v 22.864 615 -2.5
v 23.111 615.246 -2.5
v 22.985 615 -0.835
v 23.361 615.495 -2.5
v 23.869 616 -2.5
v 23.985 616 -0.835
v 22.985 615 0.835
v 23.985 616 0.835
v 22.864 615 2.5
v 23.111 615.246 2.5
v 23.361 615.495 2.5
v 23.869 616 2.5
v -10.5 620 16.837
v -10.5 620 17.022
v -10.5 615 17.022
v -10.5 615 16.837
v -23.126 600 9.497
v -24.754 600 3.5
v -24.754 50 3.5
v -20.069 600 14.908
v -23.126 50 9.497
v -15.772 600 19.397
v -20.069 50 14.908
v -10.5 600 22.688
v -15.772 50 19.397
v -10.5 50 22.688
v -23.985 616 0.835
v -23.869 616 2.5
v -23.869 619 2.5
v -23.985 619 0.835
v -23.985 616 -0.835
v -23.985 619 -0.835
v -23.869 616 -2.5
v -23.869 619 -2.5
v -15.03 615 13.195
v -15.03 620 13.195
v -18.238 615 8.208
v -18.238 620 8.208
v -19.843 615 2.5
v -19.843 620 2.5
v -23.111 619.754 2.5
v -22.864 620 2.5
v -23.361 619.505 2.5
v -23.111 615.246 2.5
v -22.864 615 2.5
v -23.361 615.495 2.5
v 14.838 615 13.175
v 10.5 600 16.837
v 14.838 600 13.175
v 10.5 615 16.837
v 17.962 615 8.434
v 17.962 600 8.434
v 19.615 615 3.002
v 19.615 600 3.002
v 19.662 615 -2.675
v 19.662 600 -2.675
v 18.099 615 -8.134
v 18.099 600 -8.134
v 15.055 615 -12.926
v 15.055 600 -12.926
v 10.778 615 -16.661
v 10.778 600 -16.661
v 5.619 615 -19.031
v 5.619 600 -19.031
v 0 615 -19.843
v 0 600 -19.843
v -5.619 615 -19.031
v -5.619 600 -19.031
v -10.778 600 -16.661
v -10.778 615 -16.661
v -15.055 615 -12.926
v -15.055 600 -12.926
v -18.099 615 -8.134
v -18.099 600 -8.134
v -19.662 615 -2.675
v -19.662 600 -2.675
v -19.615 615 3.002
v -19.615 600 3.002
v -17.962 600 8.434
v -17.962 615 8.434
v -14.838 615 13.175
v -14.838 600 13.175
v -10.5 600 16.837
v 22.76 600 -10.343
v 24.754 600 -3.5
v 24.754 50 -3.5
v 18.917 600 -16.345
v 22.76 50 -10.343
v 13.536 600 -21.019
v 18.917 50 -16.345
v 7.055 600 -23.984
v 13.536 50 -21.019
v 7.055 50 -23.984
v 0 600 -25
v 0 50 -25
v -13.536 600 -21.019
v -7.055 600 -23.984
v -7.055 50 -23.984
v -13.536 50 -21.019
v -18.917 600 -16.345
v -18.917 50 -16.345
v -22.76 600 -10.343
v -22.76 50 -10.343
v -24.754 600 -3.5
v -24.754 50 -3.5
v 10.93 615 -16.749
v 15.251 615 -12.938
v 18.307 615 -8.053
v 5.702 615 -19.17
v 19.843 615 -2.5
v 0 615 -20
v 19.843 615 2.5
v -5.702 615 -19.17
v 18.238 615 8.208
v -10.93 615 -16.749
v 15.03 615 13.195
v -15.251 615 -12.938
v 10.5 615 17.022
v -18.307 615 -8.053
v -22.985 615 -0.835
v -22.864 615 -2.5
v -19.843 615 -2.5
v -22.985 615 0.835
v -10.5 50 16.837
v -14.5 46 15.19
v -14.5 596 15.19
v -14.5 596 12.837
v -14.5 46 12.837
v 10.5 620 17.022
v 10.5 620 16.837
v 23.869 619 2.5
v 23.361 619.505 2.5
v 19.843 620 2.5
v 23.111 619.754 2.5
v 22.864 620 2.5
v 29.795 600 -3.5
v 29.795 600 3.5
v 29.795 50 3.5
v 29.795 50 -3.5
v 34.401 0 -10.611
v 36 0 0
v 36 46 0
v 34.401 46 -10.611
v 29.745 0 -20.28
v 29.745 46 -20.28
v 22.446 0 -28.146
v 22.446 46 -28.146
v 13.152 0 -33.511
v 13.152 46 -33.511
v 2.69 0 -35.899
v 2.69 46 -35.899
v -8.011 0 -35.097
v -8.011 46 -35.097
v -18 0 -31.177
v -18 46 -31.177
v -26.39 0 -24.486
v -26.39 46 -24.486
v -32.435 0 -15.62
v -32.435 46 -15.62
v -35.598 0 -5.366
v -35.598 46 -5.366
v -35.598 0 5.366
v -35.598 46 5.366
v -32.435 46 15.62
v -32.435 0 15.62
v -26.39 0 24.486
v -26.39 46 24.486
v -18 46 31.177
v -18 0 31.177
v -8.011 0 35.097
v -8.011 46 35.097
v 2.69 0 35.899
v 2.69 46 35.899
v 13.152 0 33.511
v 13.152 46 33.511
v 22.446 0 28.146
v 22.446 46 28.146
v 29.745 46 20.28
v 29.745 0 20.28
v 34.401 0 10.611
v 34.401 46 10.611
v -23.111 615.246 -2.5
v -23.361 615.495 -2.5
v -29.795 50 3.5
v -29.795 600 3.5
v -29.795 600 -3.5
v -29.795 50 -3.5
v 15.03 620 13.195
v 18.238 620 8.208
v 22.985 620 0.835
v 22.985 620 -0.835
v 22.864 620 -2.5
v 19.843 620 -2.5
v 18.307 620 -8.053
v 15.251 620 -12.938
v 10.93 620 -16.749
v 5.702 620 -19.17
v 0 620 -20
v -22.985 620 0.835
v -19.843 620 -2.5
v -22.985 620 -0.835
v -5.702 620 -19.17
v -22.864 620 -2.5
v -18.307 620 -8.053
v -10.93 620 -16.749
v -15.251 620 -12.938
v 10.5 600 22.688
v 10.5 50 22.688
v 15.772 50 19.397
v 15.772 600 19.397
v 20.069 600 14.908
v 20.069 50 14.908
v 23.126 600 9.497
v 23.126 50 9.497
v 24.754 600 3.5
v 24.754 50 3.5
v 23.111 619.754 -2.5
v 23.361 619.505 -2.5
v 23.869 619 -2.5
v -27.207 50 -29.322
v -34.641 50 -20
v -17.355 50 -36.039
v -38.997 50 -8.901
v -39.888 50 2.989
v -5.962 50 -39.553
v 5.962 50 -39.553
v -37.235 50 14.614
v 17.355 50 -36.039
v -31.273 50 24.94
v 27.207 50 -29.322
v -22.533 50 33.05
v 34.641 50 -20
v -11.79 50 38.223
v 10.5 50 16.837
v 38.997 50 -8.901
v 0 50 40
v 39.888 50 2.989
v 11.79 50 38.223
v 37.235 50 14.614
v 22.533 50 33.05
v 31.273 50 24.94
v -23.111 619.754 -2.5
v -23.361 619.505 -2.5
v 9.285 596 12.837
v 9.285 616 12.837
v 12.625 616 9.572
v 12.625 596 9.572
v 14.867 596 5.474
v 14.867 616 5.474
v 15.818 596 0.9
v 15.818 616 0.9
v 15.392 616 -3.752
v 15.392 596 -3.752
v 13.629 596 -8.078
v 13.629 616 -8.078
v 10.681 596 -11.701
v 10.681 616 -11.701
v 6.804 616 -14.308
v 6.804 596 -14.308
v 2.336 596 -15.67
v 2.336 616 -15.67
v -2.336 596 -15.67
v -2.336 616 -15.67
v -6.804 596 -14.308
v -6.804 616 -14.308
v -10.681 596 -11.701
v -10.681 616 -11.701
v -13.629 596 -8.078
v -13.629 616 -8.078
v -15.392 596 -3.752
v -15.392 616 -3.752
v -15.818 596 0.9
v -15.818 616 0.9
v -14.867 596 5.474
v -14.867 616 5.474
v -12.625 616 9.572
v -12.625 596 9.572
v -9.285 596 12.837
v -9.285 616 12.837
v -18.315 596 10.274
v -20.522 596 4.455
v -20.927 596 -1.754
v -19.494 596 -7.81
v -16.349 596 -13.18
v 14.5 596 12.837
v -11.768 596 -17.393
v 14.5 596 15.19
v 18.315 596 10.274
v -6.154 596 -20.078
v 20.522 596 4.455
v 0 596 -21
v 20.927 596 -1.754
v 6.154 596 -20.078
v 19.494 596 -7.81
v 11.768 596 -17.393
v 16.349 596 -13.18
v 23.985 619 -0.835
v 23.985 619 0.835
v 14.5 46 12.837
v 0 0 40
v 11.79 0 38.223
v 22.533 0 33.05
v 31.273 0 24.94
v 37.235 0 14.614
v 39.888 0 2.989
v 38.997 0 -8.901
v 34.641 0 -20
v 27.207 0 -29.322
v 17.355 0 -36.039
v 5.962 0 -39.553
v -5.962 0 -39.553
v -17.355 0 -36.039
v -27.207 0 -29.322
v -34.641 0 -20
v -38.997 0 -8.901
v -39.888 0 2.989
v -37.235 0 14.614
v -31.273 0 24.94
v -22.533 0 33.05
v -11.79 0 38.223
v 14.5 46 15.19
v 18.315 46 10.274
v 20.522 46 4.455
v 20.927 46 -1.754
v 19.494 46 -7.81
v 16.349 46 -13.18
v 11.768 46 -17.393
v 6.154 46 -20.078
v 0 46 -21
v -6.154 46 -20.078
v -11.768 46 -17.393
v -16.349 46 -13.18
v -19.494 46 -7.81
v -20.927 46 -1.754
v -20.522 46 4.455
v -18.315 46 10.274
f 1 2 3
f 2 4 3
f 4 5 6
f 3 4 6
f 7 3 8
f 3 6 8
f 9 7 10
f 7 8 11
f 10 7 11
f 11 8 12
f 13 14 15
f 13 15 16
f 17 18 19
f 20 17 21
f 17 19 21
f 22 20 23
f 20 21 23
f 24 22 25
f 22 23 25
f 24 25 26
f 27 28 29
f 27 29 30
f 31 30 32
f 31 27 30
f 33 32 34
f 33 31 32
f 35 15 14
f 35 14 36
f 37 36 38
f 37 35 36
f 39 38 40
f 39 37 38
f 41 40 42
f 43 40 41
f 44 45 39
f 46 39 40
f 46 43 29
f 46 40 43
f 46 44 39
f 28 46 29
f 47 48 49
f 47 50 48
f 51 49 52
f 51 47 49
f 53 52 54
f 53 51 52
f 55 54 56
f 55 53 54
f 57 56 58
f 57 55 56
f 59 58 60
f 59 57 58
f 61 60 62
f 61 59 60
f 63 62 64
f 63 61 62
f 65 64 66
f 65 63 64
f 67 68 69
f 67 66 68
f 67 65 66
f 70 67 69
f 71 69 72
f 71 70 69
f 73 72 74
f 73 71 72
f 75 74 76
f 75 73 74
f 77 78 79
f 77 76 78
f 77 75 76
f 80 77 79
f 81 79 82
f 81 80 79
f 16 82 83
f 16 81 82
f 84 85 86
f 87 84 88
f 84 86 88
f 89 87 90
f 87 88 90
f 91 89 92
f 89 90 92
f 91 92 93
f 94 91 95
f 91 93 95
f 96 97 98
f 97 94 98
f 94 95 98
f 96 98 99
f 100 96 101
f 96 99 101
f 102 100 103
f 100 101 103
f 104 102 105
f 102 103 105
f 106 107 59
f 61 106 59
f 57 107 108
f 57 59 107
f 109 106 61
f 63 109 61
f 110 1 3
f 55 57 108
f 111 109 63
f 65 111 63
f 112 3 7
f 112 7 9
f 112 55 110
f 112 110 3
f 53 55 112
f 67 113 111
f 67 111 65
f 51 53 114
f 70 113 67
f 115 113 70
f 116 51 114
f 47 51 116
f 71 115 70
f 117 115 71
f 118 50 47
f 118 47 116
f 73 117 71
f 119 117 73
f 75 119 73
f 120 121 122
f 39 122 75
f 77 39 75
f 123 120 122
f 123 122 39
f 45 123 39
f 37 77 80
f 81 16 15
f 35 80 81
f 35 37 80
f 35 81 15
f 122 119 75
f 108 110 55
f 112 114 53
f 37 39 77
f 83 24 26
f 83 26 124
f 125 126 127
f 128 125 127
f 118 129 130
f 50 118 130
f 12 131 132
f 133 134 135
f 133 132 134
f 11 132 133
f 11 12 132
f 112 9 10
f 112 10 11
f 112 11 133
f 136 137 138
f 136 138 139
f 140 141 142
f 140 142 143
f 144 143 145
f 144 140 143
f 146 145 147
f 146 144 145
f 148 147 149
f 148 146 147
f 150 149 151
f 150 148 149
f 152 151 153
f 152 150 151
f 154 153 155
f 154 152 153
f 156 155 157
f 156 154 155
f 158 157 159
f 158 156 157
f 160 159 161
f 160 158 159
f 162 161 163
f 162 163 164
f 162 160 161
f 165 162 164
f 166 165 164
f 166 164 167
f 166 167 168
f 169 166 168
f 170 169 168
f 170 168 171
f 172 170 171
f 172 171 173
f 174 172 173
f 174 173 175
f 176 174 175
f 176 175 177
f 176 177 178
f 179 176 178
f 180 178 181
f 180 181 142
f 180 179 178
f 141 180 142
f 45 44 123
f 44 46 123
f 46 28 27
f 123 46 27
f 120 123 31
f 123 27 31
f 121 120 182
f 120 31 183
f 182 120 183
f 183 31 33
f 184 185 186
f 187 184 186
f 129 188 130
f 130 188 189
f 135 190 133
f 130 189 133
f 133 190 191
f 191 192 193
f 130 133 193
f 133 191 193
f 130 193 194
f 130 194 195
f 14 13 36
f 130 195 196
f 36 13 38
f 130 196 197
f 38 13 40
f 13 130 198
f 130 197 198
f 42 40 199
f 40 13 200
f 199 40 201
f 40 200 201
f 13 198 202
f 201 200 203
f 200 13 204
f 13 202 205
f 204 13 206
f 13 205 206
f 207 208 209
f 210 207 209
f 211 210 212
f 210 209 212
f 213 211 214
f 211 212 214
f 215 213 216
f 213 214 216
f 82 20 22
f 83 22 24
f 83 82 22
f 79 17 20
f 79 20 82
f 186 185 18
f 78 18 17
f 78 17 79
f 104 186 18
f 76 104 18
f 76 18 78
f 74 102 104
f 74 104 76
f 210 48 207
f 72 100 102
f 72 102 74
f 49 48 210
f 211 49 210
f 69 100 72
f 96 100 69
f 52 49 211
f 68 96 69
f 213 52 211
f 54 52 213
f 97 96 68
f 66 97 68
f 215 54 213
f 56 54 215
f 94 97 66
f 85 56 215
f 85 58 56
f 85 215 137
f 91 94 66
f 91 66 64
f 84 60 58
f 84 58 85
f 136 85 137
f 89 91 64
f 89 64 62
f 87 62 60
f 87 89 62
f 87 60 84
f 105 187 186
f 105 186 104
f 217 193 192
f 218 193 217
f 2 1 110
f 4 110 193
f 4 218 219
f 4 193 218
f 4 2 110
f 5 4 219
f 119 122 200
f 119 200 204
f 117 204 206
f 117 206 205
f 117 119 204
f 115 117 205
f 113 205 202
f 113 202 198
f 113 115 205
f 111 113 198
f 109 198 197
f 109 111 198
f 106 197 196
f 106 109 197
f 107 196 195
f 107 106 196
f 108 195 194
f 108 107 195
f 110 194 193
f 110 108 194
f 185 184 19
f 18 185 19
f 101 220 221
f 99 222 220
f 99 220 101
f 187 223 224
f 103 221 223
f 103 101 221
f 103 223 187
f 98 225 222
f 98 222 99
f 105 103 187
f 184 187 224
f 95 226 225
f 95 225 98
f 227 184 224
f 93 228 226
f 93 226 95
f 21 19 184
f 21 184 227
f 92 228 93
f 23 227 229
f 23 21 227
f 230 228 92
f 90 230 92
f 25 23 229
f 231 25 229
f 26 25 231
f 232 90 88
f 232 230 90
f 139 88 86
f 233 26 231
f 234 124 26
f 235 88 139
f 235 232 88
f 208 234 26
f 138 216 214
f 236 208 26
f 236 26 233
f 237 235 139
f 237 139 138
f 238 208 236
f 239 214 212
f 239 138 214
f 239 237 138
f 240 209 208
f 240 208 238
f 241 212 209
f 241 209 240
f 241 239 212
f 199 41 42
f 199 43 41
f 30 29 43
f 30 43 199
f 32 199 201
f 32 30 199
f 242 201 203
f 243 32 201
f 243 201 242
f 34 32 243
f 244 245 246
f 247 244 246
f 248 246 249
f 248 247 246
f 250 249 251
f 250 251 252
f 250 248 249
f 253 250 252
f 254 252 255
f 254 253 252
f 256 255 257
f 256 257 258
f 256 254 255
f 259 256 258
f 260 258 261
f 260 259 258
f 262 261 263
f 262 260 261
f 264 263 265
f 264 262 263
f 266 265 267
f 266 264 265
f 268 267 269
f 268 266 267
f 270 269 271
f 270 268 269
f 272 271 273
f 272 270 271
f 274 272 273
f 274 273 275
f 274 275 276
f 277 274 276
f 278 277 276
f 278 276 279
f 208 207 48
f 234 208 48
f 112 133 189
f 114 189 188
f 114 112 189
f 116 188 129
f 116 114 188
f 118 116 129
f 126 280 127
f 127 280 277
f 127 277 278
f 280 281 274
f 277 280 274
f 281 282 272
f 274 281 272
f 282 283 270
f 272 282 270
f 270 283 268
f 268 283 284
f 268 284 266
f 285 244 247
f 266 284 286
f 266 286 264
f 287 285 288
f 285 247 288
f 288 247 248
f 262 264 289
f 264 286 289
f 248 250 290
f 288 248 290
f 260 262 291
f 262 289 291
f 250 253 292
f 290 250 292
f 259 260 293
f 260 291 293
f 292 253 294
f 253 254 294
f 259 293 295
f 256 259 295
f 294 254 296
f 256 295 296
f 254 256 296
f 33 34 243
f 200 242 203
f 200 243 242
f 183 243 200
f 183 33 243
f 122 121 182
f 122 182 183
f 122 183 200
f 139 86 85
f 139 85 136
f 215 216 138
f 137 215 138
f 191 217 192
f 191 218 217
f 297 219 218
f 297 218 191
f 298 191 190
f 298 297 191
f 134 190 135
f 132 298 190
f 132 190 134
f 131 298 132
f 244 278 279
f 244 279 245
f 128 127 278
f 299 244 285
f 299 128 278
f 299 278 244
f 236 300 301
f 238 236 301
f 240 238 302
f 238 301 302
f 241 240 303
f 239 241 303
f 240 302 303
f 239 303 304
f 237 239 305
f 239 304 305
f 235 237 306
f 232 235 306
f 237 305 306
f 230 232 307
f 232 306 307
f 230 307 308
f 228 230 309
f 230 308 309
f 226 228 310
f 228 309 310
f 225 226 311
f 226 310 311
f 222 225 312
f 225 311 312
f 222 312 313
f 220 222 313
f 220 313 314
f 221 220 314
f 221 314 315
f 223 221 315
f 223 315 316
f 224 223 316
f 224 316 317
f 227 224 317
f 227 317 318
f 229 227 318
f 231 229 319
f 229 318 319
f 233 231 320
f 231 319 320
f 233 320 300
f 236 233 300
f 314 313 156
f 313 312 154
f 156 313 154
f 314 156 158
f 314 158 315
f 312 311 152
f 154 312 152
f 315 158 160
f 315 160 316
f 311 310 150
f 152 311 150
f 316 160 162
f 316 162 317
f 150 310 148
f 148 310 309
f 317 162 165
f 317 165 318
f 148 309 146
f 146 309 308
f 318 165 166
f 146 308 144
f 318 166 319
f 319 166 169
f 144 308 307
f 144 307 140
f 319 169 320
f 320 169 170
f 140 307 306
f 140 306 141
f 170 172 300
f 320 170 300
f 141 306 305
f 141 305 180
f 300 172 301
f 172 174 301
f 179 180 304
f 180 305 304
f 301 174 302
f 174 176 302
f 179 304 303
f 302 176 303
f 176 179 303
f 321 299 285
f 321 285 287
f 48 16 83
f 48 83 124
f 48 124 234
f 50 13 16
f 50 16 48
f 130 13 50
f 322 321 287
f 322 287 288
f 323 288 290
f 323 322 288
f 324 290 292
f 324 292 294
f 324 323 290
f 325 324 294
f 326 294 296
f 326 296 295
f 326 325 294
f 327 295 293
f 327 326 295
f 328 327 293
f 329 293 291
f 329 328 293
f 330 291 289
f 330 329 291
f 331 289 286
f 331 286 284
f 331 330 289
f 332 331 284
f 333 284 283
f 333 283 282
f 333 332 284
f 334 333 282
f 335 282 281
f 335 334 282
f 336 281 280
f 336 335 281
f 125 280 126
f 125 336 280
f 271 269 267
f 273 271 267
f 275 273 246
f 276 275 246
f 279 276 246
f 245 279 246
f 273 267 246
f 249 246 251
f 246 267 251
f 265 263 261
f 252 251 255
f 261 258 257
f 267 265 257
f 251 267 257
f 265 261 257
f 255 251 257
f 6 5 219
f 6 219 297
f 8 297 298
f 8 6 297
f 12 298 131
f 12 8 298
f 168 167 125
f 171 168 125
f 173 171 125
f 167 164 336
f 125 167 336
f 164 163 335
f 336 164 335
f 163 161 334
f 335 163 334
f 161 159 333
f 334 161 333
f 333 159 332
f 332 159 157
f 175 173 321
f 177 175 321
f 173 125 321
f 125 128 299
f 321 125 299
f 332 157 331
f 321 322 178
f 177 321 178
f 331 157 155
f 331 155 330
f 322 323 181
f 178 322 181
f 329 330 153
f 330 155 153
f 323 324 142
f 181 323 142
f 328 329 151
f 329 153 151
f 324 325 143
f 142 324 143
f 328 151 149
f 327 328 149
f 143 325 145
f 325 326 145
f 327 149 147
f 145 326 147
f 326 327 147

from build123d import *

# Parameters (mm, degrees)
SKETCH1_R           = 25
BOSS_EXTRUDE1_DEPTH = 600
SKETCH1_3_R         = 40
SKETCH1_3_R_2       = 25
BOSS_EXTRUDE2_DEPTH = 50
BOSS_EXTRUDE3_DEPTH = 20
SKETCH30_W          = 5.156865167
SKETCH30_H          = 15
CHAMFER1_SIZE       = 1
SKETCH31_W          = 59.59
SKETCH31_H          = 7
BOSS_EXTRUDE4_DEPTH = 557
SKETCH32_W          = 21
SKETCH32_H          = 8.16254176
CUT_EXTRUDE1_DEPTH  = 570
SHELL2_DEPTH        = 596
SHELL2_2_OUTLINE_R  = 36
SHELL2_2_DEPTH      = 46
SHELL2_START        = 596
SHELL2_3_DEPTH      = 20


# Read off the part's stored shape, not the designer's step: Shell2
with BuildPart() as part:
    # Sketch1 → Boss-Extrude1 (new body)
    with BuildSketch(Plane(origin=(0, 0, 0), x_dir=(1, 0, 0), z_dir=(0, 1, 0))):
        with Locations(Location((0, 0, 0), (0, 0, 270))):
            Circle(SKETCH1_R)
    extrude(amount=BOSS_EXTRUDE1_DEPTH)

    # Sketch1<3> → Boss-Extrude2 (add)
    with BuildSketch(Plane(origin=(0, 0, 0), x_dir=(1, 0, 0), z_dir=(0, 1, 0))):
        with Locations(Location((0, 0, 0), (0, 0, 270))):
            Circle(SKETCH1_3_R)
        with Locations(Location((0, 0, 0), (0, 0, 270))):
            Circle(SKETCH1_3_R_2, mode=Mode.SUBTRACT)
    extrude(amount=BOSS_EXTRUDE2_DEPTH)

    # Sketch2 → Boss-Extrude3 (add)
    with BuildSketch(Plane(origin=(0, 600, 0), x_dir=(1, 0, 0), z_dir=(0, 1, 0))):
        with BuildLine():
            Line((19.843134833, 2.5), (23.869436525, 2.5))
            ThreePointArc((23.869436525, 2.5), (24, 0), (23.869436525, -2.5))
            Line((23.869436525, -2.5), (19.843134833, -2.5))
            ThreePointArc((19.843134833, -2.5), (0, -20), (-19.843134833, -2.5))
            Line((-19.843134833, -2.5), (-23.869436525, -2.5))
            ThreePointArc((-23.869436525, -2.5), (-24, 0), (-23.869436525, 2.5))
            Line((-23.869436525, 2.5), (-19.843134833, 2.5))
            ThreePointArc((-19.843134833, 2.5), (0, 20), (19.843134833, 2.5))
        make_face()
    extrude(amount=BOSS_EXTRUDE3_DEPTH)

    # Sketch30 → Cut-Revolve1 (revolve, cut)
    with BuildSketch(Plane.XY, mode=Mode.PRIVATE) as cut_revolve1_sk:
        with Locations((22.421567417, 607.5)):
            Rectangle(SKETCH30_W, SKETCH30_H)
    revolve(cut_revolve1_sk.sketch.rotate(Axis((0, 498.152783653, 0), (0, 1, 0)), 90), axis=Axis((0, 498.152783653, 0), (0, 1, 0)), mode=Mode.SUBTRACT)

    # Chamfer1
    chamfer1_edges = [part.edges().sort_by_distance(p)[0] for p in [
        (-24, 620, 0),
        (24, 620, 0),
        (-24, 615, 0),
        (24, 615, 0),
    ]]
    chamfer(chamfer1_edges, length=CHAMFER1_SIZE)

    # Sketch31 → Boss-Extrude4 (add)
    with BuildSketch(Plane(origin=(0, 600, 0), x_dir=(1, 0, 0), z_dir=(0, 1, 0))):
        Rectangle(SKETCH31_W, SKETCH31_H)
    extrude(amount=-BOSS_EXTRUDE4_DEPTH)

    # Sketch32 → Cut-Extrude1 (cut)
    with BuildSketch(Plane(origin=(0, 620, 0), x_dir=(1, 0, 0), z_dir=(0, 1, 0))):
        with Locations((0, -20.91872912)):
            Rectangle(SKETCH32_W, SKETCH32_H)
    extrude(amount=-CUT_EXTRUDE1_DEPTH, mode=Mode.SUBTRACT)

    # Shell2 outline → Shell2 (cut)
    with BuildSketch(Plane(origin=(0, 0, 0), x_dir=(1, 0, 0), z_dir=(0, 1, 0))):
        with BuildLine():
            ThreePointArc((14.5, -15.190457531), (0, 21), (-14.5, -15.190457531))
            Line((-14.5, -15.190457531), (-14.5, -12.83745824))
            Line((-14.5, -12.83745824), (14.5, -12.83745824))
            Line((14.5, -12.83745824), (14.5, -15.190457531))
        make_face()
    extrude(amount=SHELL2_DEPTH, mode=Mode.SUBTRACT)

    # Shell2 2 outline → Shell2 2 (cut)
    with BuildSketch(Plane(origin=(0, 0, 0), x_dir=(1, 0, 0), z_dir=(0, 1, 0))):
        Circle(SHELL2_2_OUTLINE_R)
        with BuildLine():
            Line((-14.5, -12.83745824), (-14.5, -15.190457531))
            ThreePointArc((-14.5, -15.190457531), (0, 21), (14.5, -15.190457531))
            Line((14.5, -15.190457531), (14.5, -12.83745824))
            Line((14.5, -12.83745824), (-14.5, -12.83745824))
        make_face(mode=Mode.SUBTRACT)
    extrude(amount=SHELL2_2_DEPTH, mode=Mode.SUBTRACT)

    # Shell2 3 outline → Shell2 3 (cut)
    with BuildSketch(Plane(origin=(0, 0, 0), x_dir=(1, 0, 0), z_dir=(0, 1, 0)).offset(SHELL2_START)):
        with BuildLine():
            ThreePointArc((9.284642549, -12.83745824), (0, 15.843134833), (-9.284642549, -12.83745824))
            Line((-9.284642549, -12.83745824), (9.284642549, -12.83745824))
        make_face()
    extrude(amount=SHELL2_3_DEPTH, mode=Mode.SUBTRACT)


solid = part.part
